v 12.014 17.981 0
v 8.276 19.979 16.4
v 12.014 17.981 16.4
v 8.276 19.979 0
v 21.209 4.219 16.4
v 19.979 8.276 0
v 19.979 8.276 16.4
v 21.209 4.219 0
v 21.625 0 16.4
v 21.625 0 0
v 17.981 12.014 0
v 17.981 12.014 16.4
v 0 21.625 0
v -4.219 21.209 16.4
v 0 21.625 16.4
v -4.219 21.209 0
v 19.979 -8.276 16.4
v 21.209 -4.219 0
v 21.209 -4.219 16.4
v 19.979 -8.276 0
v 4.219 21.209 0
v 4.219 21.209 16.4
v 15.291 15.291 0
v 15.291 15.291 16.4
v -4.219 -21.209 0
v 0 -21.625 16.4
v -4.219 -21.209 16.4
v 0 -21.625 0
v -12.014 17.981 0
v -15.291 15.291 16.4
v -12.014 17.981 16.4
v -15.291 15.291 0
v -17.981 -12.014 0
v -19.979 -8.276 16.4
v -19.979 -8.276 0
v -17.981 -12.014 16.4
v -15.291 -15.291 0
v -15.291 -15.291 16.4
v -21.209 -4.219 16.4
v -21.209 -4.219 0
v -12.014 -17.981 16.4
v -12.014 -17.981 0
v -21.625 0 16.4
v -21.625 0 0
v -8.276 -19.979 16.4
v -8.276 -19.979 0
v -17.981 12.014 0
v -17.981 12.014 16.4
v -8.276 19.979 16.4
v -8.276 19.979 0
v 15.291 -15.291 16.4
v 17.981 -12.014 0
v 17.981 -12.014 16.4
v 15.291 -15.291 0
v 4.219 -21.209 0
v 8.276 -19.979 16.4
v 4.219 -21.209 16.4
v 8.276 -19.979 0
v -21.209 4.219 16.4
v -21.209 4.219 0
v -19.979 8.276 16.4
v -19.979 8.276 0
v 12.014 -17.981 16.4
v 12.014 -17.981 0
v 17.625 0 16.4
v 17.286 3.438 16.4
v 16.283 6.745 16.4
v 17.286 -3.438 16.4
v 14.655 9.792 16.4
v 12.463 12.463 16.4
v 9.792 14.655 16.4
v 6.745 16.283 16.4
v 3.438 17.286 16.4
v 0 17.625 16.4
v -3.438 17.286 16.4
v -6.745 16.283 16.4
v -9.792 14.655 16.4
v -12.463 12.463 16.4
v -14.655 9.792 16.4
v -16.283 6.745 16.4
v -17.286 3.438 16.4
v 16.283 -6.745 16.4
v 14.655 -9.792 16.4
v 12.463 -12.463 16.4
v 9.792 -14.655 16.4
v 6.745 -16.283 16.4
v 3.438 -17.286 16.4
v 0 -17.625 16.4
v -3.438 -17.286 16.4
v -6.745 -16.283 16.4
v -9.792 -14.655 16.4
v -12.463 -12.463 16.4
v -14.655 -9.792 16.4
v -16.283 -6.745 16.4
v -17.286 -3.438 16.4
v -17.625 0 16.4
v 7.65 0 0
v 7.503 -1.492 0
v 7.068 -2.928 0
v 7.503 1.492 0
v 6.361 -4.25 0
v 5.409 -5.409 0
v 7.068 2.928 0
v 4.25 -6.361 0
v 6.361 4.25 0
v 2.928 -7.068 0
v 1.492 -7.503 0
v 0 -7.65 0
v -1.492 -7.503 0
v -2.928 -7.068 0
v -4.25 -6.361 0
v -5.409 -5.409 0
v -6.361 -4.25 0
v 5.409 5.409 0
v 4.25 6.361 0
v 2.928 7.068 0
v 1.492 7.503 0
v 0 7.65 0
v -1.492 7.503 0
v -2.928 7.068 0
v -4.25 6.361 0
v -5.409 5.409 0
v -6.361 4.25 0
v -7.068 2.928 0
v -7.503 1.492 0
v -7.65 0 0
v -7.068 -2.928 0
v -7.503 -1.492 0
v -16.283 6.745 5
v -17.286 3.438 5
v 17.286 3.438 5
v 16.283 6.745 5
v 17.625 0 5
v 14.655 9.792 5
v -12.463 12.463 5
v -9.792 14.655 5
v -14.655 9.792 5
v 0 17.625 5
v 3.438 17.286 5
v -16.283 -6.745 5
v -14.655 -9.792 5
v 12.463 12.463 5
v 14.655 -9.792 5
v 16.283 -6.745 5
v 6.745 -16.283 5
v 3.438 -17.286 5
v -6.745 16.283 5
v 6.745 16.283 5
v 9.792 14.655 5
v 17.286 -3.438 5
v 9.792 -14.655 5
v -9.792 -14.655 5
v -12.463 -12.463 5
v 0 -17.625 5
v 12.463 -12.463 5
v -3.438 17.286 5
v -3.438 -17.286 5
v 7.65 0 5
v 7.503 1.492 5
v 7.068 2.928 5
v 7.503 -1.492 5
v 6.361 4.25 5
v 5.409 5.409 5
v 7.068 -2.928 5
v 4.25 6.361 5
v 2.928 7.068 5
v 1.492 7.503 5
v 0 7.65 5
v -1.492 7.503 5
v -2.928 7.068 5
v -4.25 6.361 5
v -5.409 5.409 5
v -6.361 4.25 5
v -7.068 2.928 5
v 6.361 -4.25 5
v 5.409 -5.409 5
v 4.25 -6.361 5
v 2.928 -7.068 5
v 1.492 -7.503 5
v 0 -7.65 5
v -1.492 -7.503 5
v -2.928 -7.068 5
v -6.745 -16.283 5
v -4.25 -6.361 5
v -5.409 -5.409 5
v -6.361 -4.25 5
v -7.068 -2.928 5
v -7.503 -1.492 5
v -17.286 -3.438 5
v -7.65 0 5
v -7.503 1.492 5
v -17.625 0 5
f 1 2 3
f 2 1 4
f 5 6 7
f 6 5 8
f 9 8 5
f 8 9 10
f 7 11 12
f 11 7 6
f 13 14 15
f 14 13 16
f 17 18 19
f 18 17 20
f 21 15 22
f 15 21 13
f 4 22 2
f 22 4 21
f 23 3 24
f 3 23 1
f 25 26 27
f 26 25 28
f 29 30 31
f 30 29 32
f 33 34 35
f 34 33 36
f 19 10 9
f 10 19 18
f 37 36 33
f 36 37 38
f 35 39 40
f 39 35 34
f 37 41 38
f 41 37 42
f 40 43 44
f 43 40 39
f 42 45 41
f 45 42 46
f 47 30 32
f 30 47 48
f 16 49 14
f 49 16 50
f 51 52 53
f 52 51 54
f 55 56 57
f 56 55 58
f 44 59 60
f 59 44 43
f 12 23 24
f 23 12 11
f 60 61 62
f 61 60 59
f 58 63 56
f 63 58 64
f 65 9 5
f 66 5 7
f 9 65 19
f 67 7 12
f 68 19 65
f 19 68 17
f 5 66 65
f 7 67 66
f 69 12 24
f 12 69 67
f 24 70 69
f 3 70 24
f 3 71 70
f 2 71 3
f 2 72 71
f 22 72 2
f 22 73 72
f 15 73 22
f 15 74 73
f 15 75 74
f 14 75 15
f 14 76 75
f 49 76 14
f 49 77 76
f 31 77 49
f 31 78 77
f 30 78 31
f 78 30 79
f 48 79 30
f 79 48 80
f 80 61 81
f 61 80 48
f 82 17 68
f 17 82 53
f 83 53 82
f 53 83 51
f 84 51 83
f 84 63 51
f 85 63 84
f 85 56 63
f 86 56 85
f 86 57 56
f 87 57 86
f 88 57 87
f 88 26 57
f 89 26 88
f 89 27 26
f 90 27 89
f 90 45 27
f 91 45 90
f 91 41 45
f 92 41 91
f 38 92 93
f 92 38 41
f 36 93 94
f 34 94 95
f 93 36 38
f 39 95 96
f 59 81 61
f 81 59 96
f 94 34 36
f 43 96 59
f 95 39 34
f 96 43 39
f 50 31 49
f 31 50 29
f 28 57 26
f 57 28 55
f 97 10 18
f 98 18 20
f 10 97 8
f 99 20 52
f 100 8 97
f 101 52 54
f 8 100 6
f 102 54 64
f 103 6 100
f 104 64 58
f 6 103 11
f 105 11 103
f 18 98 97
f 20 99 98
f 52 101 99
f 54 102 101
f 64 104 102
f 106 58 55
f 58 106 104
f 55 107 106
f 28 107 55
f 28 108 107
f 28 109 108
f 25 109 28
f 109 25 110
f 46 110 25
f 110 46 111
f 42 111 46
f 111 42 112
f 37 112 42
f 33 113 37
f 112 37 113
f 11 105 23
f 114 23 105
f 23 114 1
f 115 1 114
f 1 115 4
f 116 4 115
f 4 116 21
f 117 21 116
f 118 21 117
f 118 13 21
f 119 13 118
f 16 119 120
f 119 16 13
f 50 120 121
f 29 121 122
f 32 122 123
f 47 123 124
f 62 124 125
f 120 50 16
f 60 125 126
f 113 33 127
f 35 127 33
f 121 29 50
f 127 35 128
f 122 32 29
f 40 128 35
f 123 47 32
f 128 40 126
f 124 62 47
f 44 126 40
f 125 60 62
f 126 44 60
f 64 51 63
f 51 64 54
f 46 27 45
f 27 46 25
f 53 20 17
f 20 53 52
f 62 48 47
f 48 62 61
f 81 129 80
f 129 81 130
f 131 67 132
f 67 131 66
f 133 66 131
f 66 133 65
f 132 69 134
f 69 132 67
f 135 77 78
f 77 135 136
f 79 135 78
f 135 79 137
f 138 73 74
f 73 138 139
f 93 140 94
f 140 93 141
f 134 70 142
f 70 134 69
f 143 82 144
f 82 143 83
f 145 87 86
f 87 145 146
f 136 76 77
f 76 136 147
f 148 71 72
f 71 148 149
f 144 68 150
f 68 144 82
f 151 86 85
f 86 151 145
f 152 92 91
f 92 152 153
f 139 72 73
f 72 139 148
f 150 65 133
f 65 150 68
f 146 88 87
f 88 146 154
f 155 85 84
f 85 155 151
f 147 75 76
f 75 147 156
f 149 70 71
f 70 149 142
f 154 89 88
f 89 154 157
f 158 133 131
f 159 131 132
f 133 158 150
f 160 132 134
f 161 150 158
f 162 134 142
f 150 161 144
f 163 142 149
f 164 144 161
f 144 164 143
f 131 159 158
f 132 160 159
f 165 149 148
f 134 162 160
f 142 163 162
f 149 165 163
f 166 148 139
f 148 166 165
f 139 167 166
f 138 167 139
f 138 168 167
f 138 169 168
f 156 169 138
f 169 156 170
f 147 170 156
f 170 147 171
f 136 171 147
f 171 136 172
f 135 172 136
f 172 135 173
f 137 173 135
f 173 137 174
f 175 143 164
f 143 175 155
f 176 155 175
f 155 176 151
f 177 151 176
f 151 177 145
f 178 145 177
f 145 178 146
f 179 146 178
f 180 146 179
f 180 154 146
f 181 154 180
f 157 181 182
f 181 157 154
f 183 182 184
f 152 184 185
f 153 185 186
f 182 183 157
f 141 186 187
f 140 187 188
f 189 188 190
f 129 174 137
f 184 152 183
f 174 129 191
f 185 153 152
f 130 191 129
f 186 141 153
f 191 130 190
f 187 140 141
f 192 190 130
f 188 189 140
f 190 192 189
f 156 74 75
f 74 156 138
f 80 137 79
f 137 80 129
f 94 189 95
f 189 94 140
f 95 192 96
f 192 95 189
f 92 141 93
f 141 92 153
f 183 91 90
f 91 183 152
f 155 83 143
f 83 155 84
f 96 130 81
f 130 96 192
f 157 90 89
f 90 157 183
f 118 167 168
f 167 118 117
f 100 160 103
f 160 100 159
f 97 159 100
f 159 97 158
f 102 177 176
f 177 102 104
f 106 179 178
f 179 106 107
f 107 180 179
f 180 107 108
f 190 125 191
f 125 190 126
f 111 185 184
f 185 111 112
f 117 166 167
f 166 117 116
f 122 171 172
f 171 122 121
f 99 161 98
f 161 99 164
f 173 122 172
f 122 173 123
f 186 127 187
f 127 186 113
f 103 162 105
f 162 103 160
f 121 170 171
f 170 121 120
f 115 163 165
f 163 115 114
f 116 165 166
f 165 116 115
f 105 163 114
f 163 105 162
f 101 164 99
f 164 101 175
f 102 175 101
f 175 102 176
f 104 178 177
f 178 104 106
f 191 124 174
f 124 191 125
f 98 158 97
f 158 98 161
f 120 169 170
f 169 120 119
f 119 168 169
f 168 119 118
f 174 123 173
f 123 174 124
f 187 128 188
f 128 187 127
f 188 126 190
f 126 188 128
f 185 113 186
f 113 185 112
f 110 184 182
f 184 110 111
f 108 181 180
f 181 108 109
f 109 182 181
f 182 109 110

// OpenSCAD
$fn = 32;

// ----------------------------------------------------------------------
// Bearing housing: seat for 6202 (35 x 11 mm), 43.25 mm body
// ----------------------------------------------------------------------

// --- parameters (mm) ---
housing_d = 43.25;        // housing outside diameter
housing_h = 16.4;         // overall housing height
wall_t = 4;               // wall thickness
seat_d = 35.25;           // 6202 seat, 0.25 mm clearance
seat_h = 11.4;            // pocket depth
shoulder = 5;             // shoulder under the bearing
pass_d = 15.3;            // shaft passage

module body() {
  cylinder(h = housing_h, d = housing_d);
}

difference() {
  union() {
    body();
  }
  translate([0, 0, housing_h - seat_h]) cylinder(h = seat_h + 1, d = seat_d);
  translate([0, 0, -1]) cylinder(h = housing_h - seat_h + 1, d = pass_d);
}
